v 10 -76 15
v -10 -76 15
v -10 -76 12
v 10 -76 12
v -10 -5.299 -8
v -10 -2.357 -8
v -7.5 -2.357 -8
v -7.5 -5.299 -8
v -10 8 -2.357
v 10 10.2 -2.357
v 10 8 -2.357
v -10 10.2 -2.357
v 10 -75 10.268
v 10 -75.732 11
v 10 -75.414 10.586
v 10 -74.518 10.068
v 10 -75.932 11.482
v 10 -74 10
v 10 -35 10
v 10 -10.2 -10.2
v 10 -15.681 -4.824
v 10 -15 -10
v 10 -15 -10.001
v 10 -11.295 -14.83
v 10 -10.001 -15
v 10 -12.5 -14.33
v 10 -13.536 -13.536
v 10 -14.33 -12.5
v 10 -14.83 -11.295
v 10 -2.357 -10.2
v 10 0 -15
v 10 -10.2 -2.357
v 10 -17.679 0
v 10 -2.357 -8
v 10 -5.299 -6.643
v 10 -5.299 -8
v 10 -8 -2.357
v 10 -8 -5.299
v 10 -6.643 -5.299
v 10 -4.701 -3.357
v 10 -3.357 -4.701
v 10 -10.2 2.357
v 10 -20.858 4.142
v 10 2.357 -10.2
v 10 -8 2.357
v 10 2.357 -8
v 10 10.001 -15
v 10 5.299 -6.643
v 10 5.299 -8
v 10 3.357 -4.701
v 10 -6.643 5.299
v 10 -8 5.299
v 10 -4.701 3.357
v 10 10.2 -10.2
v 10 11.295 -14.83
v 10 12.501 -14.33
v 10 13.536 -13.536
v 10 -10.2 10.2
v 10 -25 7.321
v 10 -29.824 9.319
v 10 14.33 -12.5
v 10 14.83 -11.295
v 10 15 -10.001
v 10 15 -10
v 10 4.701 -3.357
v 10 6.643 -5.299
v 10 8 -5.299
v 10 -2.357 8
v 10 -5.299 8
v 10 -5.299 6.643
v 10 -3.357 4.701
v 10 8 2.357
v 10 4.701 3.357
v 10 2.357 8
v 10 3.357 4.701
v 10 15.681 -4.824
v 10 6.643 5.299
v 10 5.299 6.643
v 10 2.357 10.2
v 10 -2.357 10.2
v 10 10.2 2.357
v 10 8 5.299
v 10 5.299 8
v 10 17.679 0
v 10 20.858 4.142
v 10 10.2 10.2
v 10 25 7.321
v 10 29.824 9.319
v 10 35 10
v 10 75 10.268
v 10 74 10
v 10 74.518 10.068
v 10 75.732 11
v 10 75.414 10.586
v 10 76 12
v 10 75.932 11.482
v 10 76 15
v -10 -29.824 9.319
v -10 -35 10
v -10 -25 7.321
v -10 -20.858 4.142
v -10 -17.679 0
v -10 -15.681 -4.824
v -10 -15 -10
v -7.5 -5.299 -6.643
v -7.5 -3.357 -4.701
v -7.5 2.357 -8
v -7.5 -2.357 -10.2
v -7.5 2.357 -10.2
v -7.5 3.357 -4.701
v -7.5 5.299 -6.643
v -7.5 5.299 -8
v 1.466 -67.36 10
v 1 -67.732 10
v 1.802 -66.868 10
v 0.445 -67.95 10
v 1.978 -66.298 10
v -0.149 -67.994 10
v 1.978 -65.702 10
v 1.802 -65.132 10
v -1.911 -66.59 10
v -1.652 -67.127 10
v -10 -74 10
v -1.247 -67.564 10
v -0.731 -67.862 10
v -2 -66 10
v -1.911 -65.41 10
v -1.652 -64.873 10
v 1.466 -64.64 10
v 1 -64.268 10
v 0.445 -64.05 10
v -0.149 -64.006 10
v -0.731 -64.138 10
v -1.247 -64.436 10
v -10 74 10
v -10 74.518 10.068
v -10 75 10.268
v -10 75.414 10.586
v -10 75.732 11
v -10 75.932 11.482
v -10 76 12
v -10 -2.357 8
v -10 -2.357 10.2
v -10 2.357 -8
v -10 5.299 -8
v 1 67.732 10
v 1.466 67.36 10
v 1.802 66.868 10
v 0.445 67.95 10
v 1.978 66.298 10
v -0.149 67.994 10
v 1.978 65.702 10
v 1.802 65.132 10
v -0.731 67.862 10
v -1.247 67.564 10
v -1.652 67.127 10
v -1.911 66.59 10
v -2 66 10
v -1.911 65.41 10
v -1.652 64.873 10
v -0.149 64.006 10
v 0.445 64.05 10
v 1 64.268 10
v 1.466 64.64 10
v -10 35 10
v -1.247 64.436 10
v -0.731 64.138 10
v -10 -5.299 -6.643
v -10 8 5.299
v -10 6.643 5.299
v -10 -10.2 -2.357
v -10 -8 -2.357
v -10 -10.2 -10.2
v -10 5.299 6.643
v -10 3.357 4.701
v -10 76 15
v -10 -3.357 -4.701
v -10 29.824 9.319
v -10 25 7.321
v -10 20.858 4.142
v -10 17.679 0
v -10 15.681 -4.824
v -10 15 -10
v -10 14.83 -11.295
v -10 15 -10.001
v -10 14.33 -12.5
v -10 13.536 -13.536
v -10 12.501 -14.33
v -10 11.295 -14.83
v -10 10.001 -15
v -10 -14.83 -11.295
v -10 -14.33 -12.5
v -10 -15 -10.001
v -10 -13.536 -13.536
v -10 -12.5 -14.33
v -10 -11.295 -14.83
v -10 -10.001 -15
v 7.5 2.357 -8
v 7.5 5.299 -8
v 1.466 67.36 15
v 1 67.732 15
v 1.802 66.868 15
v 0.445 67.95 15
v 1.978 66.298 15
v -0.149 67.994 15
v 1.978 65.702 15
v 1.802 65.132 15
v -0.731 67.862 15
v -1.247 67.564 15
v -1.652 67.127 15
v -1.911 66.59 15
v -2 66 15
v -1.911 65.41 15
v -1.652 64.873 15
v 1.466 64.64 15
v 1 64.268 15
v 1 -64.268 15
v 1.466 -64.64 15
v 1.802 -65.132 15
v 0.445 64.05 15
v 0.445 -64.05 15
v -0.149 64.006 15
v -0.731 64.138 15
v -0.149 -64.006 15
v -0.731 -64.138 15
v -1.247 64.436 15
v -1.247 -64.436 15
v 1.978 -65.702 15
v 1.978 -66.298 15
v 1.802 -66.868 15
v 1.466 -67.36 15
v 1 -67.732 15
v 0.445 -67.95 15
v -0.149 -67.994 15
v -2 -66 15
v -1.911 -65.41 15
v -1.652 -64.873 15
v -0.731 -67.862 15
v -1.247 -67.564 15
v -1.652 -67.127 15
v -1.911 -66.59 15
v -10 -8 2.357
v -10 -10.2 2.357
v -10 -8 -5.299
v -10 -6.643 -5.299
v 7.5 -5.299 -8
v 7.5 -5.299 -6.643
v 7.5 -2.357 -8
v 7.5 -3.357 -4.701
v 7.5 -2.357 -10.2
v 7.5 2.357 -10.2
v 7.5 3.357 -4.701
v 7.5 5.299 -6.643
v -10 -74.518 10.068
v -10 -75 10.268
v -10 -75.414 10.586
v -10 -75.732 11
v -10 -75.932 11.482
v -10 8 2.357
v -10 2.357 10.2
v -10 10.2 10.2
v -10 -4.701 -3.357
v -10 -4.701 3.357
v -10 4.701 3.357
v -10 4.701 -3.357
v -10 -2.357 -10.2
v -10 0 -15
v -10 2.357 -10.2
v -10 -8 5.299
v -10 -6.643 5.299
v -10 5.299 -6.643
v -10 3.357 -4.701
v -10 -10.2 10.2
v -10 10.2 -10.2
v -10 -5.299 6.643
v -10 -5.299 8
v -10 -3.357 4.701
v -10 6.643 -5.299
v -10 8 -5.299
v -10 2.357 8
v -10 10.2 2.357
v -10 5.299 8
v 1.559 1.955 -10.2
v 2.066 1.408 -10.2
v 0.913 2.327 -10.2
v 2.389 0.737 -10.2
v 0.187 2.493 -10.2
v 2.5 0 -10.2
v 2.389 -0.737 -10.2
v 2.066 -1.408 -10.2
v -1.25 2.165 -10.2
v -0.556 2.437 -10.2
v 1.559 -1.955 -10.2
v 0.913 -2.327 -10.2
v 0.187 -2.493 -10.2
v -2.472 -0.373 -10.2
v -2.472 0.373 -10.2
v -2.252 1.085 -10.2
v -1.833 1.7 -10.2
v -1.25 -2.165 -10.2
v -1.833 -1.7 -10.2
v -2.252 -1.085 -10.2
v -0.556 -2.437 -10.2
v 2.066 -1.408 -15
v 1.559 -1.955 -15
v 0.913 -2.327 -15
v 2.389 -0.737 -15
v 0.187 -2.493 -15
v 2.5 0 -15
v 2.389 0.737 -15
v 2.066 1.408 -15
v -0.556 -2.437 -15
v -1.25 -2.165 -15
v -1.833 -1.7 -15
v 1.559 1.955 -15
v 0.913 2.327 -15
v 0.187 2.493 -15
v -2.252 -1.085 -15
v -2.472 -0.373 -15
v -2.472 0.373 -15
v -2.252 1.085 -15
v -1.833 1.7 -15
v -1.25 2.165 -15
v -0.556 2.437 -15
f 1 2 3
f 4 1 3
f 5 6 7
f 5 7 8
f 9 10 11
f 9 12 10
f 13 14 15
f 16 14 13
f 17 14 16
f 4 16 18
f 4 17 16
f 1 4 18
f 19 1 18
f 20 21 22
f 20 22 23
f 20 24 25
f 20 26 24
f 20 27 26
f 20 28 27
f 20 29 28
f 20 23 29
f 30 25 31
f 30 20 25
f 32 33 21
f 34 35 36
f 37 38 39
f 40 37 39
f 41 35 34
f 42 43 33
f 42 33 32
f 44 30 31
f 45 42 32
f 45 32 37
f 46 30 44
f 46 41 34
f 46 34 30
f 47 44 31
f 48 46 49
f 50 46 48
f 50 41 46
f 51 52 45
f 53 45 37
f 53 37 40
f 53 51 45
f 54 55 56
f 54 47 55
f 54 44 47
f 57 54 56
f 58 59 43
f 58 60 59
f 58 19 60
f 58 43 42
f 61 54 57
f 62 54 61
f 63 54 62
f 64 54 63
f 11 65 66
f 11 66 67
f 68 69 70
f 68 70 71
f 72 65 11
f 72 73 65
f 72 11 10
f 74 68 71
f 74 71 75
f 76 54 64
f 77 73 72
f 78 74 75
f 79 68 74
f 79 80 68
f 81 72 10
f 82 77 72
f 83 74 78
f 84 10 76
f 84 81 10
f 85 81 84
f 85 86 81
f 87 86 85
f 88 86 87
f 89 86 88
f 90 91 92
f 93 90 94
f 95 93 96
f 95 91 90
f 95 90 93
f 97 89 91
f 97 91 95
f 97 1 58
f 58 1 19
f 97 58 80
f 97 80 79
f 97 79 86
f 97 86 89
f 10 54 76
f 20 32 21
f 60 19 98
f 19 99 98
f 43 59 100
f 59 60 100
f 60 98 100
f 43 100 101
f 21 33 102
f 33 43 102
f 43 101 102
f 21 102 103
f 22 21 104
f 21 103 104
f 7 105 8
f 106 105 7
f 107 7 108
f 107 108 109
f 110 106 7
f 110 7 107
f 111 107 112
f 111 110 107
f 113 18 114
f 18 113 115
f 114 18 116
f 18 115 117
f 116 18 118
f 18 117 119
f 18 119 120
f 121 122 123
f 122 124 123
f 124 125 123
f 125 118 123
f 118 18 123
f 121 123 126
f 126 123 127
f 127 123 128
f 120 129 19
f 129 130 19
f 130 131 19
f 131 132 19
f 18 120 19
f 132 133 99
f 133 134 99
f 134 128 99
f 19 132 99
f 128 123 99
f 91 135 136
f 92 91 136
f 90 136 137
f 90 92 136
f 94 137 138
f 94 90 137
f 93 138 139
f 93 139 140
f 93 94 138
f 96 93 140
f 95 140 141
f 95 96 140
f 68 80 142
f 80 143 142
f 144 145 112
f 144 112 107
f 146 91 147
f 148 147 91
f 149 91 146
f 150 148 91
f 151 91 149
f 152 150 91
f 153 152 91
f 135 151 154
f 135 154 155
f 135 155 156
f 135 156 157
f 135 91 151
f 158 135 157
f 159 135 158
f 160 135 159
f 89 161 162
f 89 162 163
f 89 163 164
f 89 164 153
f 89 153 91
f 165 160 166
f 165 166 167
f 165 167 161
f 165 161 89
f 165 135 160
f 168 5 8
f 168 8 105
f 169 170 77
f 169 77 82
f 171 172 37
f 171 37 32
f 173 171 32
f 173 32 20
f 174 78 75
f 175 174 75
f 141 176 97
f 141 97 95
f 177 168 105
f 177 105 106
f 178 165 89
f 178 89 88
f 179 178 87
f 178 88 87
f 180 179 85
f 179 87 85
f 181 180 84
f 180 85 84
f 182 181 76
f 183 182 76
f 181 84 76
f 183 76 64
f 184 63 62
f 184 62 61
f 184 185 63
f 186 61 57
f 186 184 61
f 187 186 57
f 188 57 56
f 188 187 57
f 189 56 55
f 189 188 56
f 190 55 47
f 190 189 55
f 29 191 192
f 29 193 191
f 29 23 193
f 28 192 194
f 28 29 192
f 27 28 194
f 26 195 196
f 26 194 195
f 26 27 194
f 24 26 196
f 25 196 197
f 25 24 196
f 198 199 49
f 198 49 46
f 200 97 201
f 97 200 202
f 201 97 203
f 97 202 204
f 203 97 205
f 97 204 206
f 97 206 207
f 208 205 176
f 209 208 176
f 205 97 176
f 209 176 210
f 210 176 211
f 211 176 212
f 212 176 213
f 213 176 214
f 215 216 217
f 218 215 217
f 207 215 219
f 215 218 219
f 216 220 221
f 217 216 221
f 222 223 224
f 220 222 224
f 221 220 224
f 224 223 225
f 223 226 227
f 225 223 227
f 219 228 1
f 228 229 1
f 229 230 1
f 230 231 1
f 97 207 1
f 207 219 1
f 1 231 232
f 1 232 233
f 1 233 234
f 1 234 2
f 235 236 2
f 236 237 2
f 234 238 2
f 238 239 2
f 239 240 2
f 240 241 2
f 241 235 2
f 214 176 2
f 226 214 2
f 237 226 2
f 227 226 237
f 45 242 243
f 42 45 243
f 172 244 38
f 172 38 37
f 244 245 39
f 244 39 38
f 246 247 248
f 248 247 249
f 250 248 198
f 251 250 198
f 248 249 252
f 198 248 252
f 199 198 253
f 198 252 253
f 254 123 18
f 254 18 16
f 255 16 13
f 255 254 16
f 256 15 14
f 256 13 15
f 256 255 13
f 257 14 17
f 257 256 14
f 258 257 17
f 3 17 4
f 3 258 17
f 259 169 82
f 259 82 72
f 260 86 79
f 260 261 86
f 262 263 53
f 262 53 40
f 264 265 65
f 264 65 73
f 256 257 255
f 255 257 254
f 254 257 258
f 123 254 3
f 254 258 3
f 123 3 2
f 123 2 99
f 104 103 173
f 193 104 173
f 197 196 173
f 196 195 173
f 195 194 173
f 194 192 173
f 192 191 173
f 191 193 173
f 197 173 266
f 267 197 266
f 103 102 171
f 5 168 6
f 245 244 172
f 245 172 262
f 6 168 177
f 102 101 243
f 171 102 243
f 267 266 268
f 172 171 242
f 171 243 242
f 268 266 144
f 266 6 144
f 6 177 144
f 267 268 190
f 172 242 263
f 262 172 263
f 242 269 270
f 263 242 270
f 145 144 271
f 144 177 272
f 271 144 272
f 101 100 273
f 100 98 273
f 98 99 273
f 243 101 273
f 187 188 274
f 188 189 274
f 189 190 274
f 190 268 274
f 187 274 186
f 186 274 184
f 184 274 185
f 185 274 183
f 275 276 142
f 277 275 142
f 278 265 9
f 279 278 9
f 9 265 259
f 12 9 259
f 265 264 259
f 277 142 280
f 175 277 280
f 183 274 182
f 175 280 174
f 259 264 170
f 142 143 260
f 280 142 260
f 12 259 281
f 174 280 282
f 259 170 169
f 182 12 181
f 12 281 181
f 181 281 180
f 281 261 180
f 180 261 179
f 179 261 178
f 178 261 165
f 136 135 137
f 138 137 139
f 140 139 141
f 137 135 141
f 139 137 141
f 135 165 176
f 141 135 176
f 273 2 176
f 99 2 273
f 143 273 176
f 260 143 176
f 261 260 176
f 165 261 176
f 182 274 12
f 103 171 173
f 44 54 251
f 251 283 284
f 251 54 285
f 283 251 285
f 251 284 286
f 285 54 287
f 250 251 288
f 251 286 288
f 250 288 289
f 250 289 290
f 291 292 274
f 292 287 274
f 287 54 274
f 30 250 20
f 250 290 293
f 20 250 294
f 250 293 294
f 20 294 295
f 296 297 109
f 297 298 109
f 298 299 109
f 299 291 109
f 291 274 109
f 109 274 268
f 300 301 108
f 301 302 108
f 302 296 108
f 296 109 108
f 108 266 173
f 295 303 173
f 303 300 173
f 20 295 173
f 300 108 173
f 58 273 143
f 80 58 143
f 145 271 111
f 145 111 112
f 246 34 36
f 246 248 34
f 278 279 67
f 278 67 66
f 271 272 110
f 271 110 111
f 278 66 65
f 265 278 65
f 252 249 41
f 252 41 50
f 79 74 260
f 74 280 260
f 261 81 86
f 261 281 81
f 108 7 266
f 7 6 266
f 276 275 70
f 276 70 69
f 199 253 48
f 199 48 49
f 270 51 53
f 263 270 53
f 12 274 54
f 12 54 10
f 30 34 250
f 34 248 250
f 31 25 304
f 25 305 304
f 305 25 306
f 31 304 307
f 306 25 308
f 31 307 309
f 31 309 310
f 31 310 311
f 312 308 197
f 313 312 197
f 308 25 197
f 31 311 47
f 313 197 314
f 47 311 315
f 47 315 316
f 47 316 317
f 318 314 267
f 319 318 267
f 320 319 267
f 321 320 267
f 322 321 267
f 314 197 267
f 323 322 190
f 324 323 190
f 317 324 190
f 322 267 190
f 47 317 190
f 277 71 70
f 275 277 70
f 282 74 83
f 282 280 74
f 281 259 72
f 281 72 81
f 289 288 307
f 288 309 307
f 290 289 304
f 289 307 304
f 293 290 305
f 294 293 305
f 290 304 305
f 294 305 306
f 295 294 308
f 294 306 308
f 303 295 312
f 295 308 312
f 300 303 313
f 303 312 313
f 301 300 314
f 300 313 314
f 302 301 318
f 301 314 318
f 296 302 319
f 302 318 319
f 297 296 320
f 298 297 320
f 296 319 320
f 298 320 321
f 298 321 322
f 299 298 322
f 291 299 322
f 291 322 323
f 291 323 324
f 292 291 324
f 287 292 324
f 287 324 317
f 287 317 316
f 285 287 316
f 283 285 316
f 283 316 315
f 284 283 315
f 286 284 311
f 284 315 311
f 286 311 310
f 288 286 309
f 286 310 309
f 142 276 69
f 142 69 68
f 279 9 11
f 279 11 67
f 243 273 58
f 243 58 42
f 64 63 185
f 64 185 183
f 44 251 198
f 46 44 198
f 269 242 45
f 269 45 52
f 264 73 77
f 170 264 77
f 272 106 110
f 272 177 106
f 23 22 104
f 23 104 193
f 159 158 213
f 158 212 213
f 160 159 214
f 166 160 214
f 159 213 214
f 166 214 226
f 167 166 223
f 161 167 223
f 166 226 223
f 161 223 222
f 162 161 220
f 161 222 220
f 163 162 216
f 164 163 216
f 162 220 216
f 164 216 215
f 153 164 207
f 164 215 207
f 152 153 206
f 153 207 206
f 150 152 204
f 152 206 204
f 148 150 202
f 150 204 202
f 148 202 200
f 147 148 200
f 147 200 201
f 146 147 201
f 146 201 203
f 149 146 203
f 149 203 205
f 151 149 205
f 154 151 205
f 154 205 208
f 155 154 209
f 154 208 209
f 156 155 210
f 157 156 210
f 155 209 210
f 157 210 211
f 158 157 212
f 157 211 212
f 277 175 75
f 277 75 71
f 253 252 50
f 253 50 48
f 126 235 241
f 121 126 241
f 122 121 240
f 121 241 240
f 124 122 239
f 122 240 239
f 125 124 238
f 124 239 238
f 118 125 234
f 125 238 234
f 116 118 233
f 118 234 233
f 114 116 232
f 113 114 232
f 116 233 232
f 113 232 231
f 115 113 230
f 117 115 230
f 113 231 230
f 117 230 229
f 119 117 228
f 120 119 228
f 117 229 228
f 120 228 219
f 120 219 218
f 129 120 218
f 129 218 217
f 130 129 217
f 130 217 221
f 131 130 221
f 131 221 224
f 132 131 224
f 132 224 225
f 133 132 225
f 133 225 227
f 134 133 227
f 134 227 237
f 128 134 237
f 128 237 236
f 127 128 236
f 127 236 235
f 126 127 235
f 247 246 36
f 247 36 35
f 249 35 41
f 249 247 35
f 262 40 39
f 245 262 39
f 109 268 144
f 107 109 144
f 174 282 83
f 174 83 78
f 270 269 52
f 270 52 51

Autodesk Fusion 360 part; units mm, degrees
sketch "Sketch1" plane through (0, 0, 0) normal (1, 0, 0) x (0, 1, 0)
  line L0 (3.44, 4.5007) -> (-3.44, 4.5007)
  line L1 (2.3572, -10.2) -> (2.3572, -8)
  line L2 (5.2993, 8) -> (5.2993, 6.6428)
  line L3 (-8.2, 5.4993) -> (-6.56, 5.4993)
  line L4 (4.7007, 3.3572) -> (6.6428, 5.2993)
  line L5 (5.2993, -6.6428) -> (5.2993, -8)
  line L6 (-8.2, -5.4993) -> (-8.2, -2.84)
  line L7 (-5.4993, -6.56) -> (-3.44, -4.5007)
  line L8 (-3.3572, 4.7007) -> (-5.2993, 6.6428)
  line L9 (8, 2.3572) -> (10.2, 4.5572)
  line L10 (10, -10) -> (10, -4.64)
  line L11 (10.2, -2.3572) -> (8, -2.3572)
  line L12 (5.4993, 6.56) -> (3.44, 4.5007)
  line L13 (8.2, 2.84) -> (10, 4.64)
  line L14 (-5.2993, 6.6428) -> (-5.2993, 8)
  line L15 (-8.2, 2.84) -> (-8.2, 5.4993)
  line L16 (-6.6428, -5.2993) -> (-8, -5.2993)
  line L17 (-10, 4.64) -> (-8.2, 2.84)
  line L18 (10.2, 10.2) -> (4.5572, 10.2)
  line L19 (-4.5572, 10.2) -> (-10.2, 10.2)
  line L20 (3.3572, 4.7007) -> (-3.3572, 4.7007)
  line L21 (-10.2, 2.3572) -> (-10.2, 4.5572)
  line L22 (10, 4.64) -> (10, 10)
  line L23 (-2.3572, 10.2) -> (-2.3572, 8)
  line L24 (-8, 2.3572) -> (-10.2, 2.3572)
  line L25 (-2.3572, 8) -> (-4.5572, 10.2)
  line L26 (6.56, 5.4993) -> (8.2, 5.4993)
  line L27 (-2.84, -8.2) -> (-5.4993, -8.2)
  line L28 (8, 2.3572) -> (10.2, 2.3572)
  line L29 (4.5007, 3.44) -> (6.56, 5.4993)
  line L30 (2.3572, -8) -> (4.5572, -10.2)
  line L31 (10.2, 2.3572) -> (10.2, 4.5572)
  line L32 (2.84, 8.2) -> (5.4993, 8.2)
  line L33 (4.64, 10) -> (2.84, 8.2)
  line L34 (4.5572, 10.2) -> (2.3572, 8)
  line L35 (10.2, -4.5572) -> (10.2, -2.3572)
  line L36 (10, -4.64) -> (8.2, -2.84)
  line L37 (10.2, -10.2) -> (10.2, -4.5572)
  line L38 (-3.3572, -4.7007) -> (3.3572, -4.7007)
  line L39 (-3.44, -4.5007) -> (3.44, -4.5007)
  line L40 (5.4993, -8.2) -> (2.84, -8.2)
  line L41 (5.4993, -6.56) -> (5.4993, -8.2)
  line L42 (8, -5.2993) -> (6.6428, -5.2993)
  line L43 (4.7007, -3.3572) -> (4.7007, 3.3572)
  line L44 (6.6428, -5.2993) -> (4.7007, -3.3572)
  line L45 (5.2993, -8) -> (2.3572, -8)
  line L46 (4.5572, -10.2) -> (10.2, -10.2)
  circle A0 centre (0, 0) radius 2.5
  line L47 (-15, 15) -> (15, -15) construction
  line L48 (10.2, -4.5572) -> (8, -2.3572)
  line L49 (8.2, -5.4993) -> (6.56, -5.4993)
  line L50 (4.5007, -3.44) -> (4.5007, 3.44)
  line L51 (15, -15) -> (15, 15)
  line L52 (8.2, -2.84) -> (8.2, -5.4993)
  line L53 (4.5572, -10.2) -> (2.3572, -10.2)
  line L54 (-15, -15) -> (15, -15)
  line L55 (15, 15) -> (-15, 15)
  line L56 (4.64, -10) -> (10, -10)
  line L57 (6.56, -5.4993) -> (4.5007, -3.44)
  line L58 (-15, 15) -> (-15, -15)
  line L59 (3.3572, -4.7007) -> (5.2993, -6.6428)
  line L60 (2.84, -8.2) -> (4.64, -10)
  line L61 (8, -2.3572) -> (8, -5.2993)
  line L62 (3.44, -4.5007) -> (5.4993, -6.56)
  line L63 (15, 15) -> (-15, -15) construction
  line L64 (-8.2, -2.84) -> (-10, -4.64)
  line L65 (-8, 5.2993) -> (-6.6428, 5.2993)
  line L66 (-8, -5.2993) -> (-8, -2.3572)
  line L67 (-3.44, 4.5007) -> (-5.4993, 6.56)
  line L68 (-5.4993, -8.2) -> (-5.4993, -6.56)
  line L69 (-4.5007, 3.44) -> (-4.5007, -3.44)
  line L70 (-5.4993, 6.56) -> (-5.4993, 8.2)
  line L71 (-10, -4.64) -> (-10, -10)
  line L72 (-10.2, 4.5572) -> (-8, 2.3572)
  line L73 (10.2, 4.5572) -> (10.2, 10.2)
  line L74 (8, 5.2993) -> (8, 2.3572)
  line L75 (2.3572, 8) -> (5.2993, 8)
  line L76 (-8, -2.3572) -> (-10.2, -4.5572)
  line L77 (-5.2993, -6.6428) -> (-3.3572, -4.7007)
  line L78 (-4.5572, -10.2) -> (-2.3572, -8)
  line L79 (-8, -2.3572) -> (-10.2, -2.3572)
  line L80 (5.4993, 8.2) -> (5.4993, 6.56)
  line L81 (-2.3572, -10.2) -> (-4.5572, -10.2)
  line L82 (-2.84, 8.2) -> (-4.64, 10)
  line L83 (-10, -10) -> (-4.64, -10)
  line L84 (-8, 2.3572) -> (-8, 5.2993)
  line L85 (2.3572, 10.2) -> (4.5572, 10.2)
  line L86 (8.2, 5.4993) -> (8.2, 2.84)
  line L87 (-10, 10) -> (-10, 4.64)
  line L88 (-5.2993, 8) -> (-2.3572, 8)
  line L89 (-10.2, -2.3572) -> (-10.2, -4.5572)
  line L90 (-10.2, -4.5572) -> (-10.2, -10.2)
  line L91 (-6.56, -5.4993) -> (-8.2, -5.4993)
  line L92 (-4.64, 10) -> (-10, 10)
  line L93 (-5.4993, 8.2) -> (-2.84, 8.2)
  line L94 (-6.56, 5.4993) -> (-4.5007, 3.44)
  line L95 (-2.3572, -8) -> (-2.3572, -10.2)
  line L96 (-4.5007, -3.44) -> (-6.56, -5.4993)
  line L97 (-4.64, -10) -> (-2.84, -8.2)
  line L98 (-10.2, -10.2) -> (-4.5572, -10.2)
  line L99 (-5.2993, -8) -> (-5.2993, -6.6428)
  line L100 (6.6428, 5.2993) -> (8, 5.2993)
  line L101 (5.2993, 6.6428) -> (3.3572, 4.7007)
  line L102 (-2.3572, -8) -> (-5.2993, -8)
  line L103 (10, 10) -> (4.64, 10)
  line L104 (-6.6428, 5.2993) -> (-4.7007, 3.3572)
  line L105 (-4.7007, -3.3572) -> (-6.6428, -5.2993)
  line L106 (-4.5572, 10.2) -> (-2.3572, 10.2)
  line L107 (-4.7007, 3.3572) -> (-4.7007, -3.3572)
  line L108 (2.3572, 8) -> (2.3572, 10.2)
  line L109 (-10.2, 10.2) -> (-10.2, 4.5572)
  line L110 (0, 15) -> (66, 15)
  line L111 (66, 15) -> (66, 10)
  line L112 (66, 10) -> (15, 10)
  line L113 (0, 15) -> (-66, 15)
  line L114 (-66, 15) -> (-66, 10)
  line L115 (-66, 10) -> (-15, 10)
  line L116 (66, 15) -> (76, 15)
  line L117 (76, 15) -> (76, 10)
  line L118 (76, 10) -> (66, 10)
  line L119 (66, 10) -> (66, 15)
  line L120 (-66, 15) -> (-76, 15)
  line L121 (-76, 15) -> (-76, 10)
  line L122 (-76, 10) -> (-66, 10)
  line L123 (-66, 10) -> (-66, 15)
  line L124 (-2.3572, -10.2) -> (2.3572, -10.2)
  line L125 (0, -10.2) -> (0, -15)
  dimension "d143" = 0.2
  dimension "d2" = 30
  dimension "d3" = 30
  dimension "d13" = 5
  dimension "d5" = 66
  dimension "d6" = 5
  dimension "d7" = 66
  dimension "d8" = 5
  dimension "d9" = 10
  dimension "d10" = 5
  dimension "d11" = 10
  dimension "d12" = 5
extrude "Extrude1" add sketch "Sketch1" along normal mid plane 20 contours L1 L5 L38 L45 L59 L77 L95 L99 L102 L124 | L51 L54 L55 L58 L110 L113 | L58 L113 L114 L115 L123 | L51 L110 L111 L112 L119 | L114 L120 L121 L122 L123 | L111 L116 L117 L118 L119
extrude "Extrude2" cut sketch "Sketch1" along normal mid plane 15 contours L1 L5 L38 L45 L59 L77 L95 L99 L102 L124
sketch "Sketch2" plane through (0, 0, -15) normal (0, 0, -1) x (1, 0, 0)
  line L0 (-10, -15) -> (10, -15)
  line L1 (10, -15) -> (10, 15)
  line L2 (10, 15) -> (-10, 15)
  line L3 (-10, 15) -> (-10, -15)
  circle A0 centre (0, 0) radius 2.5
  dimension "d18" = 5
extrude "Extrude3" cut sketch "Sketch2" against normal blind 17 contours A0
sketch "Sketch3" plane through (0, 0, 15) normal (0, 0, 1) x (-1, 0, 0)
  line L0 (10, 76) -> (-10, 76)
  line L1 (-10, 76) -> (-10, -76)
  line L2 (-10, -76) -> (10, -76)
  line L3 (10, -76) -> (10, 76)
  circle A0 centre (0, 66) radius 2
  line L4 (0, 66) -> (0, 76)
  circle A1 centre (0, -66) radius 2
  line L5 (-10, 76) -> (10, 76)
  line L6 (10, 76) -> (10, 75)
  line L7 (10, 75) -> (-10, 75)
  line L8 (-10, 75) -> (-10, 76)
  line L9 (-10, -76) -> (10, -76)
  line L10 (10, -76) -> (10, -75)
  line L11 (10, -75) -> (-10, -75)
  line L12 (-10, -75) -> (-10, -76)
  point P0 (0, -66)
  dimension "d21" = 4
  dimension "d22" = 4
  dimension "d25" = 1
  dimension "d26" = 20
  dimension "d27" = 1
extrude "Extrude4" cut sketch "Sketch3" against normal blind 20 contours A0 | A1
fillet "Fillet2" radius 2 2 edges at (0, 76, 10) (0, -76, 10)
fillet "Fillet3" radius 20 2 edges at (0, -15, 10) (0, 15, 10)
fillet "Fillet4" radius 5 2 edges at (0, 15, -15) (0, -15, -15)
equation "d5 = ( 132 / 2 ) * 1 mm"
